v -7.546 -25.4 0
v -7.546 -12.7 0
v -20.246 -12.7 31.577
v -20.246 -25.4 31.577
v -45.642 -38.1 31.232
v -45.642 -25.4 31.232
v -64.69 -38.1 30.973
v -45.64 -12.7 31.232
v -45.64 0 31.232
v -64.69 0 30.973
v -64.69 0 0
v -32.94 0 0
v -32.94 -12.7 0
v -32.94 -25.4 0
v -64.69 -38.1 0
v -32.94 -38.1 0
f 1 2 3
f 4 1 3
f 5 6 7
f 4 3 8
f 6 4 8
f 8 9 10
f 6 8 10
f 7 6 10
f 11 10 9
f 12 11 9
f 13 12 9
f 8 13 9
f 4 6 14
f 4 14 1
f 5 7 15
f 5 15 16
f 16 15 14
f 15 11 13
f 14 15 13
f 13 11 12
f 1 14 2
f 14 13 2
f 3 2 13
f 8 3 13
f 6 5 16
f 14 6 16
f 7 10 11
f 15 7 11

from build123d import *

# Parameters (mm, degrees)
F1_DEPTH = 38.1
F3_DEPTH = 12.7
F5_DEPTH = 12.7
F7_DEPTH = 25.401


with BuildPart() as f1:
    # F0 (on Front) → F1 (new body)
    with BuildSketch(Plane.XZ):
        Polygon((-7.5456544791, 31.75), (-64.6903658043, 30.9725248881), (-64.6903658043, 0), (-7.5456544791, 0), align=None)
    extrude(amount=F1_DEPTH)

    # F2 (on face) → F3 (cut)
    with BuildSketch(Plane.XZ.offset(38.1)):
        Polygon((-7.5456544791, 31.75), (-45.6421286959, 31.2316832588), (-32.9403658043, 0), (-7.5456544791, 0), align=None)
    extrude(amount=-F3_DEPTH, mode=Mode.SUBTRACT)

    # F4 (on face) → F5 (cut)
    with BuildSketch(Plane(origin=(0, 0, 0), x_dir=(-1, 0, 0), z_dir=(0, 1, 0))):
        Polygon((32.9403658043, 0), (45.6403658043, 31.2317072435), (7.5456544791, 31.75), (7.5456544791, 0), align=None)
    extrude(amount=-F5_DEPTH, mode=Mode.SUBTRACT)

    # F6 (on face) → F7 (cut, through all)
    with BuildSketch(Plane(origin=(0, -12.7, 0), x_dir=(-1, 0, 0), z_dir=(0, 1, 0))):
        Polygon((7.5456544791, 0), (20.2456544791, 31.5772117631), (7.5456544791, 31.75), align=None)
    extrude(amount=-F7_DEPTH, mode=Mode.SUBTRACT)


solid = f1.part
